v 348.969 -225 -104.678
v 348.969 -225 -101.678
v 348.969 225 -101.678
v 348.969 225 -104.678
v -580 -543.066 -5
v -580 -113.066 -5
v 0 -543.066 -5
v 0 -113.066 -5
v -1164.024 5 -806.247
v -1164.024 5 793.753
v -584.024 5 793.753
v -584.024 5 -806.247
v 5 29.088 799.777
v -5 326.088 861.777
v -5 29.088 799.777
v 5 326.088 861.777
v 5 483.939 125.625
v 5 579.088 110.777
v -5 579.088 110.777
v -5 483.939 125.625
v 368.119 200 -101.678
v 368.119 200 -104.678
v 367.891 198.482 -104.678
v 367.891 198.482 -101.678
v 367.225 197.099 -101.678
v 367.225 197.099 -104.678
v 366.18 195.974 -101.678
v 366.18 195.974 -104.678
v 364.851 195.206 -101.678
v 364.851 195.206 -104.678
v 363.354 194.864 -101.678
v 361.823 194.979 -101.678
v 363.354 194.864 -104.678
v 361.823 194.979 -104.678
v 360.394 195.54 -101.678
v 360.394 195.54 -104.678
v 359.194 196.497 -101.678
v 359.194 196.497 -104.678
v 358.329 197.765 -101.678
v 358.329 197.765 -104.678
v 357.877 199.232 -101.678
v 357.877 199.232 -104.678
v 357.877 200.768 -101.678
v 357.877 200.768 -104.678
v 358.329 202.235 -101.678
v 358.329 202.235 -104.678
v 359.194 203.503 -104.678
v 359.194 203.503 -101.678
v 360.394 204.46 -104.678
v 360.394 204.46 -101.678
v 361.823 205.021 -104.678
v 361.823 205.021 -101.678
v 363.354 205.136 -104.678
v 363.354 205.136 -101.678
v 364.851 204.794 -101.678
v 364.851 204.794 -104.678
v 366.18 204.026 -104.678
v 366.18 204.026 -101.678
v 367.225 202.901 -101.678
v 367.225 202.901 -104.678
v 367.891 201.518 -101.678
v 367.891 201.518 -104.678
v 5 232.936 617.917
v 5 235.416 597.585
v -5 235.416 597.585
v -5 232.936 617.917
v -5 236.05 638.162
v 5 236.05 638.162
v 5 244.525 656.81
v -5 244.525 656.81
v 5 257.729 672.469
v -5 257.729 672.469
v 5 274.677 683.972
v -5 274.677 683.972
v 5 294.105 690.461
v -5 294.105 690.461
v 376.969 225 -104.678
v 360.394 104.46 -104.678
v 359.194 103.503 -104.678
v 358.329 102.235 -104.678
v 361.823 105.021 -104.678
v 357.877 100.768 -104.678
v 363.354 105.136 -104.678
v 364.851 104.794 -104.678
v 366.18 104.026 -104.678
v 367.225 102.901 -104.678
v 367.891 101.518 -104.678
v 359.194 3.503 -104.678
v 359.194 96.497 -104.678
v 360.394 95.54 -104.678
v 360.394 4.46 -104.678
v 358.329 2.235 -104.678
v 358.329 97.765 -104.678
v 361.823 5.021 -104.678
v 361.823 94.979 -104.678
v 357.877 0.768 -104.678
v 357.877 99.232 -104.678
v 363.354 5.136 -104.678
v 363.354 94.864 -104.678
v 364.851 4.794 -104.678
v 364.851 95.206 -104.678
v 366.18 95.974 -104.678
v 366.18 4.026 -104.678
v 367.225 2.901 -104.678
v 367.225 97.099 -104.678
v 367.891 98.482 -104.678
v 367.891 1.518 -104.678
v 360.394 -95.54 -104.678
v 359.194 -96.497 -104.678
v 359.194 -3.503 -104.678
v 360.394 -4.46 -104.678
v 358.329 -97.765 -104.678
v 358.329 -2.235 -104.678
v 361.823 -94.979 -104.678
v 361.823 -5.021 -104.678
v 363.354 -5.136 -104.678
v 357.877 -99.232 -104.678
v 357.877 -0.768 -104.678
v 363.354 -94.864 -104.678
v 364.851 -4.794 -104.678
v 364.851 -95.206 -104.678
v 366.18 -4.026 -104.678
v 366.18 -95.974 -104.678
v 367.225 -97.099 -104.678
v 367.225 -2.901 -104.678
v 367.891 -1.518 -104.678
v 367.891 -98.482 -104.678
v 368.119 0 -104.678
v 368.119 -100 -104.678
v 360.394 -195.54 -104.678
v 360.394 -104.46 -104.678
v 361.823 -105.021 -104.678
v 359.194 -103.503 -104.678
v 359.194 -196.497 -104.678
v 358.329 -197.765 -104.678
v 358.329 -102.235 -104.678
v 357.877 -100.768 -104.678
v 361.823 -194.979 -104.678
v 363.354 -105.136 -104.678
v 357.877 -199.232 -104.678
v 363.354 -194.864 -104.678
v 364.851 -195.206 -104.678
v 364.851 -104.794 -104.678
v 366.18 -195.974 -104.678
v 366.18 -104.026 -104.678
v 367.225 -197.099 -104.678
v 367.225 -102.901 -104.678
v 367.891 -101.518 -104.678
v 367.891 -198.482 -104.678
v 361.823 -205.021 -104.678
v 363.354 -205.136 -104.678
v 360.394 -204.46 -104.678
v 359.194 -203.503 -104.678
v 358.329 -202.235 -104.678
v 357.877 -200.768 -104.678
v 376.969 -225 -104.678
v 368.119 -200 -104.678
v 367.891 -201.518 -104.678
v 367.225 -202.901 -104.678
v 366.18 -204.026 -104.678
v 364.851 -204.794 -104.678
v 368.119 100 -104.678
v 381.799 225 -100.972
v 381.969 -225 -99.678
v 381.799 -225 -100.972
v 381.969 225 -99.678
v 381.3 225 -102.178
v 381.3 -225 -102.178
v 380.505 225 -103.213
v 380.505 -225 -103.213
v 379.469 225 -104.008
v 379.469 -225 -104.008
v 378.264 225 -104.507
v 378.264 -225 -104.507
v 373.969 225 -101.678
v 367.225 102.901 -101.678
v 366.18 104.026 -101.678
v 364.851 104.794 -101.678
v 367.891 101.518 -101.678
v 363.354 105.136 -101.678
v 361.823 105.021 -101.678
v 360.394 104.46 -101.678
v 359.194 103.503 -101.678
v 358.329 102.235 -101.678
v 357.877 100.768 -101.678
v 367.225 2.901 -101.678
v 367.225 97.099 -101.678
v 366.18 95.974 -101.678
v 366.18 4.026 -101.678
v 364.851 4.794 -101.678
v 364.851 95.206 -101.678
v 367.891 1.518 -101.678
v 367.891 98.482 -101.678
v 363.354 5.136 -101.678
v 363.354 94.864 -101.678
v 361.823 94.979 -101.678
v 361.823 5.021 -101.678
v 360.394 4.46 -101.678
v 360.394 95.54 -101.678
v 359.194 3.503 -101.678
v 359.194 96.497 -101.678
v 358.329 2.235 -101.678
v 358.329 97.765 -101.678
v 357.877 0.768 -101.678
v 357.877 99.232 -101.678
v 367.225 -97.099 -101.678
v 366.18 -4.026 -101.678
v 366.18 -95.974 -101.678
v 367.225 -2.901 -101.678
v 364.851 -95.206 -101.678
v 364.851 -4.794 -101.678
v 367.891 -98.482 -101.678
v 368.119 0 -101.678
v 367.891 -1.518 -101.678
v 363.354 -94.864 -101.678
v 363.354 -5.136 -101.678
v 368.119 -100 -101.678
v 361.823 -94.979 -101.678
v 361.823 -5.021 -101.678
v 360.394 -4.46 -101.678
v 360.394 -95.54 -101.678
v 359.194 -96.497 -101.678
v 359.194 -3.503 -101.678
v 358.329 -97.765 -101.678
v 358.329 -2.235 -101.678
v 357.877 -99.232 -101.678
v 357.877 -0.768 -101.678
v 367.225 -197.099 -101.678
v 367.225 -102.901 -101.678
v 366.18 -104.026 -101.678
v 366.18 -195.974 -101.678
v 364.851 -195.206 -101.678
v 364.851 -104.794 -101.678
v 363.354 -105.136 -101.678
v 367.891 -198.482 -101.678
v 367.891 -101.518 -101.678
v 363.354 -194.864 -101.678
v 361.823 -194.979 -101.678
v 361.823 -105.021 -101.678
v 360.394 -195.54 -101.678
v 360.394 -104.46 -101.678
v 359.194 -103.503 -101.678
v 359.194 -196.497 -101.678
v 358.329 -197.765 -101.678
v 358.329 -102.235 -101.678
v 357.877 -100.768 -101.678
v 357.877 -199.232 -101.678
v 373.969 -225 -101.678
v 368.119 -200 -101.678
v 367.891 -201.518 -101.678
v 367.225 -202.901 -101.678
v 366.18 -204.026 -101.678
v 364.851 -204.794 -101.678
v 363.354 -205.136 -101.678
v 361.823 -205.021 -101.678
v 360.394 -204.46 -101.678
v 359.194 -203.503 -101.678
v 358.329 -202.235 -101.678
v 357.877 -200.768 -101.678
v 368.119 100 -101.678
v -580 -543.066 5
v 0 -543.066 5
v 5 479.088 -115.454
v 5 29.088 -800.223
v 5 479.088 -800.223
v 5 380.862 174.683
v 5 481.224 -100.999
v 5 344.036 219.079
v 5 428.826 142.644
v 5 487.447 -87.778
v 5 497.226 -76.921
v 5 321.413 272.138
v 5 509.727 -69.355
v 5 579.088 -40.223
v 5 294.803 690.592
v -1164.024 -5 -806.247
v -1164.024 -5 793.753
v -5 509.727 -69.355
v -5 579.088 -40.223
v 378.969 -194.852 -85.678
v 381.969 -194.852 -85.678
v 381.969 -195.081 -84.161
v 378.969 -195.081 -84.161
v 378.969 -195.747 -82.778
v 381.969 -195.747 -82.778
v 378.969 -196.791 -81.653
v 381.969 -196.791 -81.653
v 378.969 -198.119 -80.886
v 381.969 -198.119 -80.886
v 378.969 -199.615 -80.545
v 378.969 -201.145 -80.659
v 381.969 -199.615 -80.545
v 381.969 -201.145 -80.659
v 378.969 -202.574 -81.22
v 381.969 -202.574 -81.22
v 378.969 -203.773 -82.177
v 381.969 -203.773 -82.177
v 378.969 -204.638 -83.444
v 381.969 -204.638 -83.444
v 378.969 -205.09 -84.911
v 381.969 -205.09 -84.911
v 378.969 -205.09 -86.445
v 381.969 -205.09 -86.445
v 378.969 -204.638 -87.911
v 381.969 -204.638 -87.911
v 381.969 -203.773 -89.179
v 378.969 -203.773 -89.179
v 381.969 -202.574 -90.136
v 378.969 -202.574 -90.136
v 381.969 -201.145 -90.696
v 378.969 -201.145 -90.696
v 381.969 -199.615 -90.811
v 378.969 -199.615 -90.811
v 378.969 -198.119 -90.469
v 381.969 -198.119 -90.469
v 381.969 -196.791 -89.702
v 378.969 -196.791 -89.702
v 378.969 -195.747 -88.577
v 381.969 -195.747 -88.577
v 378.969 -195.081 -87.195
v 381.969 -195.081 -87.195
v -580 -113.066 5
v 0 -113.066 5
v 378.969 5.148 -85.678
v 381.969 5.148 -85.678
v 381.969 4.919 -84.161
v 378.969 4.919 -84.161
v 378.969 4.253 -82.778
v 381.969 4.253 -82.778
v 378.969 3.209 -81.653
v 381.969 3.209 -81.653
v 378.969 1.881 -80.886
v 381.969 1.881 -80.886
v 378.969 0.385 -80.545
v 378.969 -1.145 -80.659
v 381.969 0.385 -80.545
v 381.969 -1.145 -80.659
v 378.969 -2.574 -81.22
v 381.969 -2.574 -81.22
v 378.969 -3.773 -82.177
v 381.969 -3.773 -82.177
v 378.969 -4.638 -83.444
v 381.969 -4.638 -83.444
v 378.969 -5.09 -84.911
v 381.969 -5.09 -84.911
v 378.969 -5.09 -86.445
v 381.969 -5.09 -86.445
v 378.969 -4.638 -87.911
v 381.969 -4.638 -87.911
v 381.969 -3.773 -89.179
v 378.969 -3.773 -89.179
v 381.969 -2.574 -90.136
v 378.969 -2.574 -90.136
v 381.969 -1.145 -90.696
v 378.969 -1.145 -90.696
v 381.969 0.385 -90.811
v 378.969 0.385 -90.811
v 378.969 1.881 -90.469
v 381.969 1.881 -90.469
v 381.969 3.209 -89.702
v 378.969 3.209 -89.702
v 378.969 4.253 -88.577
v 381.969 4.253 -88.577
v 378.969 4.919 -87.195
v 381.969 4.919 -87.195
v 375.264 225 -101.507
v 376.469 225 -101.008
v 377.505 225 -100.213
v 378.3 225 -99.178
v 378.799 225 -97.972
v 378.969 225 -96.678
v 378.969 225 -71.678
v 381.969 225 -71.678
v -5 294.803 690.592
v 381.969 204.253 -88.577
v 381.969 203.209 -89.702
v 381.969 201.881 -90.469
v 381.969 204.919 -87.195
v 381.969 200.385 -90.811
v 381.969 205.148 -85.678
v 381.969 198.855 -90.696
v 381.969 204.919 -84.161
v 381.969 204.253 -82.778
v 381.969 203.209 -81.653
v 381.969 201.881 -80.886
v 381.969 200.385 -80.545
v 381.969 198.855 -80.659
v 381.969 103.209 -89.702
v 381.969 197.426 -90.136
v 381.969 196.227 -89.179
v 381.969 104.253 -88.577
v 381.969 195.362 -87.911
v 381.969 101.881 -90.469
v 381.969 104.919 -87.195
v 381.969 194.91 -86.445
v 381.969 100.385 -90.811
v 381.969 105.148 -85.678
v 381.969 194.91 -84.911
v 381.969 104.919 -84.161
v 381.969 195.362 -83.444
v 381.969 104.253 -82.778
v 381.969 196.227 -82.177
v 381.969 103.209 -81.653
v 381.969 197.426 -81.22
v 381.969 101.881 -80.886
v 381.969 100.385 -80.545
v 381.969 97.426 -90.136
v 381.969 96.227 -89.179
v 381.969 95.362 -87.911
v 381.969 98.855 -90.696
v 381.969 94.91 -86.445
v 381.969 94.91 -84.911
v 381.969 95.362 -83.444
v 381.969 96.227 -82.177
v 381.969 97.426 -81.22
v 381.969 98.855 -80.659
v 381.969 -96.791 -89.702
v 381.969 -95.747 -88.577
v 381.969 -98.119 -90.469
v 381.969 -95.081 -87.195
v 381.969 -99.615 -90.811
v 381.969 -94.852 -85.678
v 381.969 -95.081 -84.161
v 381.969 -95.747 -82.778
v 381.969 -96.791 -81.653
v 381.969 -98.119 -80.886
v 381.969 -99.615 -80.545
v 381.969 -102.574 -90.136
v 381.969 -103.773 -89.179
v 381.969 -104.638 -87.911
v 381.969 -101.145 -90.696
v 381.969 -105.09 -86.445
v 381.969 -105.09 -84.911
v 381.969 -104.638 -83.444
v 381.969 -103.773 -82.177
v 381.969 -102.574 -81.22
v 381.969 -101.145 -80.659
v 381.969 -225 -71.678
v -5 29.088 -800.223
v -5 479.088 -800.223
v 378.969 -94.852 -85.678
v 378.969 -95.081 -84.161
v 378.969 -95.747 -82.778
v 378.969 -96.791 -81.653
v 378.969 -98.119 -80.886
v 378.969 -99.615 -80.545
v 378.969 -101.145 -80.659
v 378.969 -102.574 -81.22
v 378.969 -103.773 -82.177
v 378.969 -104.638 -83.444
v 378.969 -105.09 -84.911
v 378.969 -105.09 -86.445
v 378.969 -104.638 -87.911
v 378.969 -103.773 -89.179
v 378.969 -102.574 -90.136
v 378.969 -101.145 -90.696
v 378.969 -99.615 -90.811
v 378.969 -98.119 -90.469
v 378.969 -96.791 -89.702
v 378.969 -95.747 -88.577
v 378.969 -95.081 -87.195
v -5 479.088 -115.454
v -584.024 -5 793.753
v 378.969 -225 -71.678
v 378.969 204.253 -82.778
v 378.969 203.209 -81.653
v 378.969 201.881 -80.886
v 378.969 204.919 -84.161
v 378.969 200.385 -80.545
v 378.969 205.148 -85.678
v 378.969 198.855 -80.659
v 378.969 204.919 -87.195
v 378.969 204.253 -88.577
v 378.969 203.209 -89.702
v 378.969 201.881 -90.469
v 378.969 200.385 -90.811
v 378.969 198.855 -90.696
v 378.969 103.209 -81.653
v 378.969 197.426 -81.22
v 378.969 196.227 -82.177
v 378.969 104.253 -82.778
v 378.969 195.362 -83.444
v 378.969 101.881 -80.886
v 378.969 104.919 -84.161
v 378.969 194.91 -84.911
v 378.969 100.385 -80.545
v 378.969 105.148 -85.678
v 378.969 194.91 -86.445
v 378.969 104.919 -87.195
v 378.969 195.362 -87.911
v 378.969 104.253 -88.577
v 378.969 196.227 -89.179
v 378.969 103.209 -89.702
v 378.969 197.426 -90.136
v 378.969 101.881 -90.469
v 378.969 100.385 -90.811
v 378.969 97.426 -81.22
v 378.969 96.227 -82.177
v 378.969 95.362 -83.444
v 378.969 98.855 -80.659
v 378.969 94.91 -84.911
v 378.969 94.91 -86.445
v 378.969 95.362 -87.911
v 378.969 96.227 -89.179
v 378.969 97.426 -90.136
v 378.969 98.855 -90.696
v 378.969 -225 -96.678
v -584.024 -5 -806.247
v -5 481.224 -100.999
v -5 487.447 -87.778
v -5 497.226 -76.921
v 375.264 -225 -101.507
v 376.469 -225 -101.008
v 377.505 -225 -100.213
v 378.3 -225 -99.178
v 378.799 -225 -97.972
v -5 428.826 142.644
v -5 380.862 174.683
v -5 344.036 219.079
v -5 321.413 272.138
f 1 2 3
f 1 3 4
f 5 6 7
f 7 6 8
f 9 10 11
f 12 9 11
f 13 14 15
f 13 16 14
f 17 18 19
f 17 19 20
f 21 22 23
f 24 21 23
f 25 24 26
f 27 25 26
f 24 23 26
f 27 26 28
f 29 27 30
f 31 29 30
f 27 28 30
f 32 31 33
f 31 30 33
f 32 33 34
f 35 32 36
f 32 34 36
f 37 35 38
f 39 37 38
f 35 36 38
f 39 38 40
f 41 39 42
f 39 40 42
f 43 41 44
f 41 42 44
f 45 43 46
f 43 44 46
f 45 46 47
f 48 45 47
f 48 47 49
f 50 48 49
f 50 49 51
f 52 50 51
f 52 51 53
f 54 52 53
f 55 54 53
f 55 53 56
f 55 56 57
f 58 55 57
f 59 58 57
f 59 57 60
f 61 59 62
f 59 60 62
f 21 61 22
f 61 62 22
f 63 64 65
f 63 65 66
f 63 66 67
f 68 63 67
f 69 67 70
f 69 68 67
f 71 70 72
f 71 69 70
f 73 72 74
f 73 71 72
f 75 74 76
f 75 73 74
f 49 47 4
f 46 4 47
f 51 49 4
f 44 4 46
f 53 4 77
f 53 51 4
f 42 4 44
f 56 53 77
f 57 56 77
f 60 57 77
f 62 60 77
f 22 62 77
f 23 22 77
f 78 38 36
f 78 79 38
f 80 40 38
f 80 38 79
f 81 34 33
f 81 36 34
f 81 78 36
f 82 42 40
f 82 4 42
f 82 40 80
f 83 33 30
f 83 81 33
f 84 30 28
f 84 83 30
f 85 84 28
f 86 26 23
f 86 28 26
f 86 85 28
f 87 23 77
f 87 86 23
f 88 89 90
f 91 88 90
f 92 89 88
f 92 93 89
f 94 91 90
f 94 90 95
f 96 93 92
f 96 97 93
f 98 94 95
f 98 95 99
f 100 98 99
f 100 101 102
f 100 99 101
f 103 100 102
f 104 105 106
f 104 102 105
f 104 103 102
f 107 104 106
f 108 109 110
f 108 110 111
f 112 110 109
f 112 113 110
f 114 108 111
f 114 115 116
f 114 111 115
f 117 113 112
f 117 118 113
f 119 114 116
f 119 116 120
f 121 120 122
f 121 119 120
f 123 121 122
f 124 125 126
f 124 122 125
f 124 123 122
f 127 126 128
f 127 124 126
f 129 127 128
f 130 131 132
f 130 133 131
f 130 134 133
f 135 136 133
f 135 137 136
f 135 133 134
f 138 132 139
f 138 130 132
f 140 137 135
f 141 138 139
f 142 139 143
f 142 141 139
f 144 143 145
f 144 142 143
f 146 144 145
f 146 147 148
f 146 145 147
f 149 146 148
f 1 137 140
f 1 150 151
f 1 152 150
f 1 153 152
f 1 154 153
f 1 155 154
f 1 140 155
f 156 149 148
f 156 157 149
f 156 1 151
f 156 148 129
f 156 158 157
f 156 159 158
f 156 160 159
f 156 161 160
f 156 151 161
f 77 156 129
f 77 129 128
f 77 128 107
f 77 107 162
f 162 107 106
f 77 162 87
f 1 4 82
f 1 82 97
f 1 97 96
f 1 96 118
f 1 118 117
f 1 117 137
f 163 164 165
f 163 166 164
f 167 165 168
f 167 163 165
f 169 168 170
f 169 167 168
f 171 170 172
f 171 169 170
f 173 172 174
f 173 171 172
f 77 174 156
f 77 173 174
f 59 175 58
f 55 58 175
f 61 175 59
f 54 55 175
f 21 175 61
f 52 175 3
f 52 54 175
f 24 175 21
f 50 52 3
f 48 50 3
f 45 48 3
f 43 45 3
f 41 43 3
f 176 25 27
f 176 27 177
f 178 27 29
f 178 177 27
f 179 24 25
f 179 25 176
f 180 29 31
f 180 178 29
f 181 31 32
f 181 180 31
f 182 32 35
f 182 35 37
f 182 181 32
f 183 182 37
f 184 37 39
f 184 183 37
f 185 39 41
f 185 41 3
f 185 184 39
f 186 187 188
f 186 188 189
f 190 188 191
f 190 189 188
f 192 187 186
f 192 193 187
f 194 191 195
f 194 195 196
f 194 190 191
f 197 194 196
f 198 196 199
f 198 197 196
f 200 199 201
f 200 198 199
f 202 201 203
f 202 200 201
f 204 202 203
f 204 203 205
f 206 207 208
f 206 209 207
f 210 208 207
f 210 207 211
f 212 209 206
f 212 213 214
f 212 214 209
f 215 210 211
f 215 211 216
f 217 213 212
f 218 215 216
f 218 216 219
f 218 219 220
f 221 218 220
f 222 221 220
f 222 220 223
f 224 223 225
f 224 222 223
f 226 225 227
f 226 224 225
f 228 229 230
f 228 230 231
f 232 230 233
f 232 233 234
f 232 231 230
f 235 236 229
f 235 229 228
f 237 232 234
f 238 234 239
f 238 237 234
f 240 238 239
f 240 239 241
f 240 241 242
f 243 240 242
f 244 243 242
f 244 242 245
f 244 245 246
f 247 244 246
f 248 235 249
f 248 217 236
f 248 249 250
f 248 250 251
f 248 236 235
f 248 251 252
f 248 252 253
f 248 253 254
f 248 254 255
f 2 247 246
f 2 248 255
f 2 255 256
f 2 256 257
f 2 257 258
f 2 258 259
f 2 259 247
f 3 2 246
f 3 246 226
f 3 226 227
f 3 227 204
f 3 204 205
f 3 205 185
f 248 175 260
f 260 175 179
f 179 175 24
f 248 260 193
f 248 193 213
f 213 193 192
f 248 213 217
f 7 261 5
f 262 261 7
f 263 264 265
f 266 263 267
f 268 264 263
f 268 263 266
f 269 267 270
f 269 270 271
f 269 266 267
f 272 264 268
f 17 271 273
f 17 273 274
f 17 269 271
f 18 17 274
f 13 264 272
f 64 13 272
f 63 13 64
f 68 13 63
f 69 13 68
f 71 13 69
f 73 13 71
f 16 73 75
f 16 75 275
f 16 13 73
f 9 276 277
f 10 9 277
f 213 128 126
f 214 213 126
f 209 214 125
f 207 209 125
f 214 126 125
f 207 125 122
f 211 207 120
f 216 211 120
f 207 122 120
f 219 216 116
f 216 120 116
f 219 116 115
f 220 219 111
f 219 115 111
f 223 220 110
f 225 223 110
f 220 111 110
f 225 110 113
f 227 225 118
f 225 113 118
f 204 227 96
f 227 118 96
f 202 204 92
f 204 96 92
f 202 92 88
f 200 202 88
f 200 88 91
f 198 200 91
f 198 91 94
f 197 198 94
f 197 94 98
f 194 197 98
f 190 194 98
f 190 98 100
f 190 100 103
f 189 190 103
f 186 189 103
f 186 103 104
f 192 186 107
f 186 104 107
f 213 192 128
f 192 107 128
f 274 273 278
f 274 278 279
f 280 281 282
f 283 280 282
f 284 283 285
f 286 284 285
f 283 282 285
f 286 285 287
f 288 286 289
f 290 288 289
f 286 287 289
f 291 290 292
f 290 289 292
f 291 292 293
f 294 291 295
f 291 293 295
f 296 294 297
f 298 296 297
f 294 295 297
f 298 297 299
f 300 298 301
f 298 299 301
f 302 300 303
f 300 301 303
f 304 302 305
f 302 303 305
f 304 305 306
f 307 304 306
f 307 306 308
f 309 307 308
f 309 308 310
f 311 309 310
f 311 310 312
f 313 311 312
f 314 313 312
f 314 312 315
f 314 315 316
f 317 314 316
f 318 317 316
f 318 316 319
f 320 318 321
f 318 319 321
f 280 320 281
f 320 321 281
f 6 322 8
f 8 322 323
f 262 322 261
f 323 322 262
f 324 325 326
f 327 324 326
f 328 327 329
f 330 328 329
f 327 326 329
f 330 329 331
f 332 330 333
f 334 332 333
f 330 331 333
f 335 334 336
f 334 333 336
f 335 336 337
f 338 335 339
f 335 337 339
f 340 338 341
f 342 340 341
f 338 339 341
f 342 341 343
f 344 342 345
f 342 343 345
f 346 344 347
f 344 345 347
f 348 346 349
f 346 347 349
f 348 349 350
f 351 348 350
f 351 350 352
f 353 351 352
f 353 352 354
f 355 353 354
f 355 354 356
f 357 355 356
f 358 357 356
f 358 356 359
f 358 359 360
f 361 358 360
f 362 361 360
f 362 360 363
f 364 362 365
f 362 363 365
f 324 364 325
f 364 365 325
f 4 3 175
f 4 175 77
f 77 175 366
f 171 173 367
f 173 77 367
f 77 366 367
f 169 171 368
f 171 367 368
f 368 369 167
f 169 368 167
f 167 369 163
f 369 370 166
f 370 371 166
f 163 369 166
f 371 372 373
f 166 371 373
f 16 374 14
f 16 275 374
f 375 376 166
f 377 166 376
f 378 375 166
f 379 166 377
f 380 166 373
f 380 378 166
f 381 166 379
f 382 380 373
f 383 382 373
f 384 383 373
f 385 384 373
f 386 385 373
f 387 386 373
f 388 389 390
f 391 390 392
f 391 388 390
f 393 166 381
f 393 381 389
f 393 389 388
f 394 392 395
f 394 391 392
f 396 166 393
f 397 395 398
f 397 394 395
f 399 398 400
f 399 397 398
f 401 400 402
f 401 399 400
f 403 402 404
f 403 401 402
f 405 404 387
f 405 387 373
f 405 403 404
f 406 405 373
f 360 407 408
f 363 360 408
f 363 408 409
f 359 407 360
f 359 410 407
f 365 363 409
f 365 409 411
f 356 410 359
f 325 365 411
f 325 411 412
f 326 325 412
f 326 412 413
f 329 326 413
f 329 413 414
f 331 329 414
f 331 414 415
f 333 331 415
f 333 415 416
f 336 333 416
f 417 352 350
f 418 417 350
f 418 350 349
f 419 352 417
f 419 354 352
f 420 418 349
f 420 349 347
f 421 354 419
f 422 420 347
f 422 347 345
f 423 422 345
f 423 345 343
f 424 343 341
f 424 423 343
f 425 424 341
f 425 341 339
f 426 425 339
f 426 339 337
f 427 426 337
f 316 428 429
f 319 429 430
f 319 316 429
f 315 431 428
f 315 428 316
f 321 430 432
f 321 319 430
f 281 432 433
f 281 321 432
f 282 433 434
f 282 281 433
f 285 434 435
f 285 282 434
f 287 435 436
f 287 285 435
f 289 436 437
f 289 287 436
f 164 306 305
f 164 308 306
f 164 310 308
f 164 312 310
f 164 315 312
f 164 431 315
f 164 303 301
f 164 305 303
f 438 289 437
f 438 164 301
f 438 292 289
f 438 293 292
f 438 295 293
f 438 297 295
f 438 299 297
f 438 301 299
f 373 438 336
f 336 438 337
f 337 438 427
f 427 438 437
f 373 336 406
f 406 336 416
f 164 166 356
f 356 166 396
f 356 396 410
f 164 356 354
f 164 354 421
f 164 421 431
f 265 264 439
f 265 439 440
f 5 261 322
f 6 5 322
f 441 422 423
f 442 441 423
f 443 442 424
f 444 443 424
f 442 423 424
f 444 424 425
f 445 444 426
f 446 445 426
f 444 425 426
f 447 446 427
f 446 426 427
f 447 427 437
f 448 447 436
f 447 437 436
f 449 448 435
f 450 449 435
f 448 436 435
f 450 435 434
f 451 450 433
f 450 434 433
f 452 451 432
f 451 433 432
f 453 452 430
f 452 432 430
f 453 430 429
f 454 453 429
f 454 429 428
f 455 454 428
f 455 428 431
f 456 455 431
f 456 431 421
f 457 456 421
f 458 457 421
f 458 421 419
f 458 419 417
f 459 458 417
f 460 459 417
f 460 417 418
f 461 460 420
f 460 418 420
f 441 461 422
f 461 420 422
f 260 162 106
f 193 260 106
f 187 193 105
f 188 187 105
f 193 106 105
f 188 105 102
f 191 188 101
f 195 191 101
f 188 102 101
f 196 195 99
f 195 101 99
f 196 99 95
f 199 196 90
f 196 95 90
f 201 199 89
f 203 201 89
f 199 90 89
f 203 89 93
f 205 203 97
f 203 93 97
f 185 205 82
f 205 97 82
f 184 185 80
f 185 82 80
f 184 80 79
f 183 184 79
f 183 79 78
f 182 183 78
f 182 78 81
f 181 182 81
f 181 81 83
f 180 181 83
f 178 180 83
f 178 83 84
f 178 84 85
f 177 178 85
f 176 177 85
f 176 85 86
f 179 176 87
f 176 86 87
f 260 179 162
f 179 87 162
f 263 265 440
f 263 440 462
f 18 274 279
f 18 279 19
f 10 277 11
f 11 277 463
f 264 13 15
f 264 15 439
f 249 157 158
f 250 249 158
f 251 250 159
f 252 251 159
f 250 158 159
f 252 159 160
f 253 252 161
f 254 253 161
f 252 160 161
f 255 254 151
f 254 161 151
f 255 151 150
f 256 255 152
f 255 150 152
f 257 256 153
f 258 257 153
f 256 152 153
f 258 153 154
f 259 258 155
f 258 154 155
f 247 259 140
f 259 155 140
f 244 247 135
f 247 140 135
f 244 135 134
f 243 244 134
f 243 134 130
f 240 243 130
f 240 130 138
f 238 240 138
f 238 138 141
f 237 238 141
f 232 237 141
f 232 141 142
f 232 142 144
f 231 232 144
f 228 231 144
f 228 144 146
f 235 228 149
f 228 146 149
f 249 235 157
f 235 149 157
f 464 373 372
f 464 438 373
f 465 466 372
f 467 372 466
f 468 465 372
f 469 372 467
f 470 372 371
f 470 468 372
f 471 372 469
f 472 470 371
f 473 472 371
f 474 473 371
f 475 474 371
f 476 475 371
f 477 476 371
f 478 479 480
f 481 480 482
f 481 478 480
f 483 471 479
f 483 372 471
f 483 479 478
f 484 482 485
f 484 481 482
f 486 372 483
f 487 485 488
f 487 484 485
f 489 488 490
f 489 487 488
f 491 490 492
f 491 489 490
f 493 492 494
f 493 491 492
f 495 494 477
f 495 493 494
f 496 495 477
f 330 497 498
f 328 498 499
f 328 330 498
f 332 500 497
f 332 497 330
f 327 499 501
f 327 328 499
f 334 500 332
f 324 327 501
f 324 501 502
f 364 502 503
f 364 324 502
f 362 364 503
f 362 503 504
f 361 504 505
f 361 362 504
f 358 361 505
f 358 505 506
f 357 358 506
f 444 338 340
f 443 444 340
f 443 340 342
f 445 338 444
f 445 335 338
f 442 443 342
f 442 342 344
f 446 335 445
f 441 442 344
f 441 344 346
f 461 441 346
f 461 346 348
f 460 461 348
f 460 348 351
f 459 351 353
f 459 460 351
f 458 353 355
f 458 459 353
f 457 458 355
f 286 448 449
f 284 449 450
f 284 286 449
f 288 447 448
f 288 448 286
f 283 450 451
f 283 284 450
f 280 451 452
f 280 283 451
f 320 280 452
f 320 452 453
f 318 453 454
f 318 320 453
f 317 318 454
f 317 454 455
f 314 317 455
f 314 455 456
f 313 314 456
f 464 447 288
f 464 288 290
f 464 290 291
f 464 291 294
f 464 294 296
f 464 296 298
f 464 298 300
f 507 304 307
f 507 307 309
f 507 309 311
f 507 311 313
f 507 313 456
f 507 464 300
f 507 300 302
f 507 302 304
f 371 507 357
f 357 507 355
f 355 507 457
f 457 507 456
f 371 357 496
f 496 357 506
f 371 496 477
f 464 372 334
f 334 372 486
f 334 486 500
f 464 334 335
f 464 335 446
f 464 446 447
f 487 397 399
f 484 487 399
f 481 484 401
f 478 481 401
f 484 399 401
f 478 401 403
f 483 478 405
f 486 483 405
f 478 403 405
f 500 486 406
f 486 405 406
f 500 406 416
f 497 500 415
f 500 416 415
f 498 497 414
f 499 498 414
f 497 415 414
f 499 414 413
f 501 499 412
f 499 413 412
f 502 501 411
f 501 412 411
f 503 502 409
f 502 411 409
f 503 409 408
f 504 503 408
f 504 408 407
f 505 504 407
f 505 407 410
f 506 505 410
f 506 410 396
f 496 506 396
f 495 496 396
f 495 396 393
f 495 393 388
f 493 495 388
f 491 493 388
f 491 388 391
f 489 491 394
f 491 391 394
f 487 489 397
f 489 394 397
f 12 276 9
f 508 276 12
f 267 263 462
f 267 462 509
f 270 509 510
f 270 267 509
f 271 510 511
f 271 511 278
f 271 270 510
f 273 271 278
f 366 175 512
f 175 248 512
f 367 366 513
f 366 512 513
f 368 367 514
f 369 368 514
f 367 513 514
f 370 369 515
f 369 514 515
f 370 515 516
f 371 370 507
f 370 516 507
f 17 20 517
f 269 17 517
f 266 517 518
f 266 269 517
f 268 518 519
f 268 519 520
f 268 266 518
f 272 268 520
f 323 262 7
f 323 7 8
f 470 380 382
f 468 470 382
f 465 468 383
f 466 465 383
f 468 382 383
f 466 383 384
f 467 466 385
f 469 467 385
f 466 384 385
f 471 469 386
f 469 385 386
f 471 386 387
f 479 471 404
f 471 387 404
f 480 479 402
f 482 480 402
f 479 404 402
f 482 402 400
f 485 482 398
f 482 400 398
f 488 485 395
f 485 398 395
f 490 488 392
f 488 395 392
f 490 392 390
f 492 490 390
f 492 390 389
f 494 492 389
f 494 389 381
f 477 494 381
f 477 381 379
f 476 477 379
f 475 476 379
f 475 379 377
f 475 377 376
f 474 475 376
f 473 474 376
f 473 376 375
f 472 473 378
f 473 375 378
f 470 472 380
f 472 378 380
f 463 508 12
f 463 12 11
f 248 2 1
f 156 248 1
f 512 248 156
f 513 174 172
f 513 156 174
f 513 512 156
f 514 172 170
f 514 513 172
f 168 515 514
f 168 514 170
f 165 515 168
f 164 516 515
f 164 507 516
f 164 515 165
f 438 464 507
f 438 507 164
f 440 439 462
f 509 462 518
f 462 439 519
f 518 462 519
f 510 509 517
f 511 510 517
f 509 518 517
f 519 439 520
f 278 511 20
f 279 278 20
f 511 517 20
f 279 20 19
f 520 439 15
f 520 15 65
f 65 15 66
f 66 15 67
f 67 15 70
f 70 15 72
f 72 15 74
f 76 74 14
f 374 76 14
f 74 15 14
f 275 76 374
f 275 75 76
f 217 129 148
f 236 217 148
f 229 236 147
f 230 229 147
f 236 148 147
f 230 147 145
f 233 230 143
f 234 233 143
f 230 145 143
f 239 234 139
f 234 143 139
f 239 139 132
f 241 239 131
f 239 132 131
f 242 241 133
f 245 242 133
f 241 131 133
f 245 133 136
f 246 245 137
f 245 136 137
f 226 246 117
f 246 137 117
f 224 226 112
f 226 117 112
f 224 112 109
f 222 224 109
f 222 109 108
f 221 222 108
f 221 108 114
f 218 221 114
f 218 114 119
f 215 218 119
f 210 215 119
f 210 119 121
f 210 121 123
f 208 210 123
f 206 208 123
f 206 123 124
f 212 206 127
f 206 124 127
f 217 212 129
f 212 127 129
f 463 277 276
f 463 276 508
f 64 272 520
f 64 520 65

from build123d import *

# Parameters (mm, degrees)
F1_DEPTH  = 5
F2_W      = 580
F2_H      = 430
F3_DEPTH  = 5
F5_DEPTH  = 225
F6_R      = 5
F7_R      = 5.147511
F8_DEPTH  = 3
F9_R      = 5.15
F10_DEPTH = 3
F11_W     = 580
F11_H     = 1600
F12_DEPTH = 5


with BuildPart() as f1:
    # F0 (on Right) → F1 (new body, symmetric)
    with BuildSketch(Plane.YZ):
        with BuildLine():
            Line((326.088439, 861.776583), (29.088439, 799.776583))
            Line((29.088439, 799.776583), (29.088439, -800.223417))
            Line((29.088439, -800.223417), (479.088439, -800.223417))
            Line((479.088439, -800.223417), (479.088439, -115.454404))
            ThreePointArc((479.088439, -115.454404), (487.446626, -87.778433), (509.726815, -69.355299))
            Line((509.726815, -69.355299), (579.088439, -40.223417))
            Line((579.088439, -40.223417), (579.088439, 110.776583))
            Line((579.088439, 110.776583), (483.938849, 125.62478))
            ThreePointArc((483.938849, 125.62478), (380.861774, 174.683458), (321.412692, 272.138288))
            Line((321.412692, 272.138288), (235.415673, 597.584831))
            ThreePointArc((235.415673, 597.584831), (244.524753, 656.810026), (294.105218, 690.460829))
            Line((294.105218, 690.460829), (294.802907, 690.591645))
            Line((294.802907, 690.591645), (326.088439, 861.776583))
        make_face()
    extrude(amount=F1_DEPTH, both=True)


with BuildPart() as f3:
    # F2 (on Top) → F3 (new body, symmetric)
    with BuildSketch(Plane.XY):
        with Locations((-290, -328.065632)):
            Rectangle(F2_W, F2_H)
    extrude(amount=F3_DEPTH, both=True)


with BuildPart() as f5:
    # F4 (on Front) → F5 (new body, symmetric)
    with BuildSketch(Plane.XZ):
        Polygon((381.969413, -71.677771), (378.969413, -71.677771), (378.969413, -101.677771), (348.969413, -101.677771), (348.969413, -104.677771), (381.969413, -104.677771), align=None)
    extrude(amount=F5_DEPTH, both=True)

    # F6
    f6_edges = [f5.edges().sort_by_distance(p)[0] for p in [
        (381.969413, 0, -104.677771),
        (378.969413, 0, -101.677771),
    ]]
    fillet(f6_edges, radius=F6_R)

    # F7 (on face) → F8 (cut, through all)
    with BuildSketch(Plane.YZ.offset(381.969413)):
        with Locations((200, -85.677771)):
            Circle(F7_R)
        with Locations((0, -85.677771)):
            Circle(F7_R)
        with Locations((-100, -85.677771)):
            Circle(F7_R)
        with Locations((100, -85.677771)):
            Circle(F7_R)
        with Locations((-200, -85.677771)):
            Circle(F7_R)
    extrude(amount=-F8_DEPTH, mode=Mode.SUBTRACT)

    # F9 (on face) → F10 (cut, through all)
    with BuildSketch(Plane(origin=(0, 0, -104.677771), x_dir=(1, 0, 0), z_dir=(0, 0, -1))):
        with Locations((362.969413, 200)):
            Circle(F9_R)
        with Locations((362.969413, 100)):
            Circle(F9_R)
        with Locations((362.969413, 0)):
            Circle(F9_R)
        with Locations((362.969413, -100)):
            Circle(F9_R)
        with Locations((362.969413, -200)):
            Circle(F9_R)
    extrude(amount=-F10_DEPTH, mode=Mode.SUBTRACT)


with BuildPart() as f12:
    # F11 (on Front) → F12 (new body, symmetric)
    with BuildSketch(Plane.XZ):
        with Locations((-874.023603, -6.247312)):
            Rectangle(F11_W, F11_H)
    extrude(amount=F12_DEPTH, both=True)


solid = Compound([f1.part, f3.part, f5.part, f12.part])
